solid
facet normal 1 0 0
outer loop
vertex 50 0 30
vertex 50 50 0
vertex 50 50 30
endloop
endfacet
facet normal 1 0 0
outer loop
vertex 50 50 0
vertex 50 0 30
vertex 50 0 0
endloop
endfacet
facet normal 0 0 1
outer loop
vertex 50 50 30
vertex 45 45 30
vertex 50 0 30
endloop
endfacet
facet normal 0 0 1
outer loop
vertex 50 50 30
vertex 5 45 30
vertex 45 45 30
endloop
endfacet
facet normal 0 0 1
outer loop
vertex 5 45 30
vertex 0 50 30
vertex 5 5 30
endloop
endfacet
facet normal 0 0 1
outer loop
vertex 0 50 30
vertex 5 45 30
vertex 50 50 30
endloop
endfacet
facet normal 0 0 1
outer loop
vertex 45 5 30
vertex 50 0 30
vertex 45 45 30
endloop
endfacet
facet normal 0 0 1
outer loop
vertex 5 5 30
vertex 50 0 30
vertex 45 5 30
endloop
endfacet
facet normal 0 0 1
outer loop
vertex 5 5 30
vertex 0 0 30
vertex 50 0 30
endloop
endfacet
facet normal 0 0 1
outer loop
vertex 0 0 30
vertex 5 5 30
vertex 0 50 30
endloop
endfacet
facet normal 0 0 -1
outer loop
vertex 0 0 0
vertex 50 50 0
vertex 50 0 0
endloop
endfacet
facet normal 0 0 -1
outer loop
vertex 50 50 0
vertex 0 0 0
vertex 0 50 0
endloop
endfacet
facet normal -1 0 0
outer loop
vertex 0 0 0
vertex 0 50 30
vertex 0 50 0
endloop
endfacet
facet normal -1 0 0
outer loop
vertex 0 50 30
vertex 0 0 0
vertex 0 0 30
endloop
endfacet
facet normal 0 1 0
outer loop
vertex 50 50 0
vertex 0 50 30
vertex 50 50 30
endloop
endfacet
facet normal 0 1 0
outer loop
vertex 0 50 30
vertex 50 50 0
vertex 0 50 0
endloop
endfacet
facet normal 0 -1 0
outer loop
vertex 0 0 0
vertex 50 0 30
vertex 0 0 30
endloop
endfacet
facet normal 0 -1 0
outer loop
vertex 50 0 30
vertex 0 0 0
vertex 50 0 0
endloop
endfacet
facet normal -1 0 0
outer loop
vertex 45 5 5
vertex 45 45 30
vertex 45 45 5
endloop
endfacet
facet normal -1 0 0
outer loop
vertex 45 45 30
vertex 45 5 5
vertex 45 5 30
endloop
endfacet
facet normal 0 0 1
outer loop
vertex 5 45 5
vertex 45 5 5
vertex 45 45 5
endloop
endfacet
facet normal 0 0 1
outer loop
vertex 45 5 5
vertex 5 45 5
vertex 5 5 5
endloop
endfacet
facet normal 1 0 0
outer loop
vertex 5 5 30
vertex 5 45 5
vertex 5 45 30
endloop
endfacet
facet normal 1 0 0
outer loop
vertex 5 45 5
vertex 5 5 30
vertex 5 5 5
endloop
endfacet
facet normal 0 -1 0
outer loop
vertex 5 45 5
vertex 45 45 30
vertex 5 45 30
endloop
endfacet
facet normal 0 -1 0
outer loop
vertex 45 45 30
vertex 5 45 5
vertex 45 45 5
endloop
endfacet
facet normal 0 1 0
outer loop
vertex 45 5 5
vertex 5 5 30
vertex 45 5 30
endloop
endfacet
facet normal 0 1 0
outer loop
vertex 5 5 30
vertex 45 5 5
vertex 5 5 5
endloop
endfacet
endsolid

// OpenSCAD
difference() {
    cube([50, 50, 30]); // Caja exterior
    translate([5, 5, 5]) cube([40, 40, 25]); // Hueco interior
}
